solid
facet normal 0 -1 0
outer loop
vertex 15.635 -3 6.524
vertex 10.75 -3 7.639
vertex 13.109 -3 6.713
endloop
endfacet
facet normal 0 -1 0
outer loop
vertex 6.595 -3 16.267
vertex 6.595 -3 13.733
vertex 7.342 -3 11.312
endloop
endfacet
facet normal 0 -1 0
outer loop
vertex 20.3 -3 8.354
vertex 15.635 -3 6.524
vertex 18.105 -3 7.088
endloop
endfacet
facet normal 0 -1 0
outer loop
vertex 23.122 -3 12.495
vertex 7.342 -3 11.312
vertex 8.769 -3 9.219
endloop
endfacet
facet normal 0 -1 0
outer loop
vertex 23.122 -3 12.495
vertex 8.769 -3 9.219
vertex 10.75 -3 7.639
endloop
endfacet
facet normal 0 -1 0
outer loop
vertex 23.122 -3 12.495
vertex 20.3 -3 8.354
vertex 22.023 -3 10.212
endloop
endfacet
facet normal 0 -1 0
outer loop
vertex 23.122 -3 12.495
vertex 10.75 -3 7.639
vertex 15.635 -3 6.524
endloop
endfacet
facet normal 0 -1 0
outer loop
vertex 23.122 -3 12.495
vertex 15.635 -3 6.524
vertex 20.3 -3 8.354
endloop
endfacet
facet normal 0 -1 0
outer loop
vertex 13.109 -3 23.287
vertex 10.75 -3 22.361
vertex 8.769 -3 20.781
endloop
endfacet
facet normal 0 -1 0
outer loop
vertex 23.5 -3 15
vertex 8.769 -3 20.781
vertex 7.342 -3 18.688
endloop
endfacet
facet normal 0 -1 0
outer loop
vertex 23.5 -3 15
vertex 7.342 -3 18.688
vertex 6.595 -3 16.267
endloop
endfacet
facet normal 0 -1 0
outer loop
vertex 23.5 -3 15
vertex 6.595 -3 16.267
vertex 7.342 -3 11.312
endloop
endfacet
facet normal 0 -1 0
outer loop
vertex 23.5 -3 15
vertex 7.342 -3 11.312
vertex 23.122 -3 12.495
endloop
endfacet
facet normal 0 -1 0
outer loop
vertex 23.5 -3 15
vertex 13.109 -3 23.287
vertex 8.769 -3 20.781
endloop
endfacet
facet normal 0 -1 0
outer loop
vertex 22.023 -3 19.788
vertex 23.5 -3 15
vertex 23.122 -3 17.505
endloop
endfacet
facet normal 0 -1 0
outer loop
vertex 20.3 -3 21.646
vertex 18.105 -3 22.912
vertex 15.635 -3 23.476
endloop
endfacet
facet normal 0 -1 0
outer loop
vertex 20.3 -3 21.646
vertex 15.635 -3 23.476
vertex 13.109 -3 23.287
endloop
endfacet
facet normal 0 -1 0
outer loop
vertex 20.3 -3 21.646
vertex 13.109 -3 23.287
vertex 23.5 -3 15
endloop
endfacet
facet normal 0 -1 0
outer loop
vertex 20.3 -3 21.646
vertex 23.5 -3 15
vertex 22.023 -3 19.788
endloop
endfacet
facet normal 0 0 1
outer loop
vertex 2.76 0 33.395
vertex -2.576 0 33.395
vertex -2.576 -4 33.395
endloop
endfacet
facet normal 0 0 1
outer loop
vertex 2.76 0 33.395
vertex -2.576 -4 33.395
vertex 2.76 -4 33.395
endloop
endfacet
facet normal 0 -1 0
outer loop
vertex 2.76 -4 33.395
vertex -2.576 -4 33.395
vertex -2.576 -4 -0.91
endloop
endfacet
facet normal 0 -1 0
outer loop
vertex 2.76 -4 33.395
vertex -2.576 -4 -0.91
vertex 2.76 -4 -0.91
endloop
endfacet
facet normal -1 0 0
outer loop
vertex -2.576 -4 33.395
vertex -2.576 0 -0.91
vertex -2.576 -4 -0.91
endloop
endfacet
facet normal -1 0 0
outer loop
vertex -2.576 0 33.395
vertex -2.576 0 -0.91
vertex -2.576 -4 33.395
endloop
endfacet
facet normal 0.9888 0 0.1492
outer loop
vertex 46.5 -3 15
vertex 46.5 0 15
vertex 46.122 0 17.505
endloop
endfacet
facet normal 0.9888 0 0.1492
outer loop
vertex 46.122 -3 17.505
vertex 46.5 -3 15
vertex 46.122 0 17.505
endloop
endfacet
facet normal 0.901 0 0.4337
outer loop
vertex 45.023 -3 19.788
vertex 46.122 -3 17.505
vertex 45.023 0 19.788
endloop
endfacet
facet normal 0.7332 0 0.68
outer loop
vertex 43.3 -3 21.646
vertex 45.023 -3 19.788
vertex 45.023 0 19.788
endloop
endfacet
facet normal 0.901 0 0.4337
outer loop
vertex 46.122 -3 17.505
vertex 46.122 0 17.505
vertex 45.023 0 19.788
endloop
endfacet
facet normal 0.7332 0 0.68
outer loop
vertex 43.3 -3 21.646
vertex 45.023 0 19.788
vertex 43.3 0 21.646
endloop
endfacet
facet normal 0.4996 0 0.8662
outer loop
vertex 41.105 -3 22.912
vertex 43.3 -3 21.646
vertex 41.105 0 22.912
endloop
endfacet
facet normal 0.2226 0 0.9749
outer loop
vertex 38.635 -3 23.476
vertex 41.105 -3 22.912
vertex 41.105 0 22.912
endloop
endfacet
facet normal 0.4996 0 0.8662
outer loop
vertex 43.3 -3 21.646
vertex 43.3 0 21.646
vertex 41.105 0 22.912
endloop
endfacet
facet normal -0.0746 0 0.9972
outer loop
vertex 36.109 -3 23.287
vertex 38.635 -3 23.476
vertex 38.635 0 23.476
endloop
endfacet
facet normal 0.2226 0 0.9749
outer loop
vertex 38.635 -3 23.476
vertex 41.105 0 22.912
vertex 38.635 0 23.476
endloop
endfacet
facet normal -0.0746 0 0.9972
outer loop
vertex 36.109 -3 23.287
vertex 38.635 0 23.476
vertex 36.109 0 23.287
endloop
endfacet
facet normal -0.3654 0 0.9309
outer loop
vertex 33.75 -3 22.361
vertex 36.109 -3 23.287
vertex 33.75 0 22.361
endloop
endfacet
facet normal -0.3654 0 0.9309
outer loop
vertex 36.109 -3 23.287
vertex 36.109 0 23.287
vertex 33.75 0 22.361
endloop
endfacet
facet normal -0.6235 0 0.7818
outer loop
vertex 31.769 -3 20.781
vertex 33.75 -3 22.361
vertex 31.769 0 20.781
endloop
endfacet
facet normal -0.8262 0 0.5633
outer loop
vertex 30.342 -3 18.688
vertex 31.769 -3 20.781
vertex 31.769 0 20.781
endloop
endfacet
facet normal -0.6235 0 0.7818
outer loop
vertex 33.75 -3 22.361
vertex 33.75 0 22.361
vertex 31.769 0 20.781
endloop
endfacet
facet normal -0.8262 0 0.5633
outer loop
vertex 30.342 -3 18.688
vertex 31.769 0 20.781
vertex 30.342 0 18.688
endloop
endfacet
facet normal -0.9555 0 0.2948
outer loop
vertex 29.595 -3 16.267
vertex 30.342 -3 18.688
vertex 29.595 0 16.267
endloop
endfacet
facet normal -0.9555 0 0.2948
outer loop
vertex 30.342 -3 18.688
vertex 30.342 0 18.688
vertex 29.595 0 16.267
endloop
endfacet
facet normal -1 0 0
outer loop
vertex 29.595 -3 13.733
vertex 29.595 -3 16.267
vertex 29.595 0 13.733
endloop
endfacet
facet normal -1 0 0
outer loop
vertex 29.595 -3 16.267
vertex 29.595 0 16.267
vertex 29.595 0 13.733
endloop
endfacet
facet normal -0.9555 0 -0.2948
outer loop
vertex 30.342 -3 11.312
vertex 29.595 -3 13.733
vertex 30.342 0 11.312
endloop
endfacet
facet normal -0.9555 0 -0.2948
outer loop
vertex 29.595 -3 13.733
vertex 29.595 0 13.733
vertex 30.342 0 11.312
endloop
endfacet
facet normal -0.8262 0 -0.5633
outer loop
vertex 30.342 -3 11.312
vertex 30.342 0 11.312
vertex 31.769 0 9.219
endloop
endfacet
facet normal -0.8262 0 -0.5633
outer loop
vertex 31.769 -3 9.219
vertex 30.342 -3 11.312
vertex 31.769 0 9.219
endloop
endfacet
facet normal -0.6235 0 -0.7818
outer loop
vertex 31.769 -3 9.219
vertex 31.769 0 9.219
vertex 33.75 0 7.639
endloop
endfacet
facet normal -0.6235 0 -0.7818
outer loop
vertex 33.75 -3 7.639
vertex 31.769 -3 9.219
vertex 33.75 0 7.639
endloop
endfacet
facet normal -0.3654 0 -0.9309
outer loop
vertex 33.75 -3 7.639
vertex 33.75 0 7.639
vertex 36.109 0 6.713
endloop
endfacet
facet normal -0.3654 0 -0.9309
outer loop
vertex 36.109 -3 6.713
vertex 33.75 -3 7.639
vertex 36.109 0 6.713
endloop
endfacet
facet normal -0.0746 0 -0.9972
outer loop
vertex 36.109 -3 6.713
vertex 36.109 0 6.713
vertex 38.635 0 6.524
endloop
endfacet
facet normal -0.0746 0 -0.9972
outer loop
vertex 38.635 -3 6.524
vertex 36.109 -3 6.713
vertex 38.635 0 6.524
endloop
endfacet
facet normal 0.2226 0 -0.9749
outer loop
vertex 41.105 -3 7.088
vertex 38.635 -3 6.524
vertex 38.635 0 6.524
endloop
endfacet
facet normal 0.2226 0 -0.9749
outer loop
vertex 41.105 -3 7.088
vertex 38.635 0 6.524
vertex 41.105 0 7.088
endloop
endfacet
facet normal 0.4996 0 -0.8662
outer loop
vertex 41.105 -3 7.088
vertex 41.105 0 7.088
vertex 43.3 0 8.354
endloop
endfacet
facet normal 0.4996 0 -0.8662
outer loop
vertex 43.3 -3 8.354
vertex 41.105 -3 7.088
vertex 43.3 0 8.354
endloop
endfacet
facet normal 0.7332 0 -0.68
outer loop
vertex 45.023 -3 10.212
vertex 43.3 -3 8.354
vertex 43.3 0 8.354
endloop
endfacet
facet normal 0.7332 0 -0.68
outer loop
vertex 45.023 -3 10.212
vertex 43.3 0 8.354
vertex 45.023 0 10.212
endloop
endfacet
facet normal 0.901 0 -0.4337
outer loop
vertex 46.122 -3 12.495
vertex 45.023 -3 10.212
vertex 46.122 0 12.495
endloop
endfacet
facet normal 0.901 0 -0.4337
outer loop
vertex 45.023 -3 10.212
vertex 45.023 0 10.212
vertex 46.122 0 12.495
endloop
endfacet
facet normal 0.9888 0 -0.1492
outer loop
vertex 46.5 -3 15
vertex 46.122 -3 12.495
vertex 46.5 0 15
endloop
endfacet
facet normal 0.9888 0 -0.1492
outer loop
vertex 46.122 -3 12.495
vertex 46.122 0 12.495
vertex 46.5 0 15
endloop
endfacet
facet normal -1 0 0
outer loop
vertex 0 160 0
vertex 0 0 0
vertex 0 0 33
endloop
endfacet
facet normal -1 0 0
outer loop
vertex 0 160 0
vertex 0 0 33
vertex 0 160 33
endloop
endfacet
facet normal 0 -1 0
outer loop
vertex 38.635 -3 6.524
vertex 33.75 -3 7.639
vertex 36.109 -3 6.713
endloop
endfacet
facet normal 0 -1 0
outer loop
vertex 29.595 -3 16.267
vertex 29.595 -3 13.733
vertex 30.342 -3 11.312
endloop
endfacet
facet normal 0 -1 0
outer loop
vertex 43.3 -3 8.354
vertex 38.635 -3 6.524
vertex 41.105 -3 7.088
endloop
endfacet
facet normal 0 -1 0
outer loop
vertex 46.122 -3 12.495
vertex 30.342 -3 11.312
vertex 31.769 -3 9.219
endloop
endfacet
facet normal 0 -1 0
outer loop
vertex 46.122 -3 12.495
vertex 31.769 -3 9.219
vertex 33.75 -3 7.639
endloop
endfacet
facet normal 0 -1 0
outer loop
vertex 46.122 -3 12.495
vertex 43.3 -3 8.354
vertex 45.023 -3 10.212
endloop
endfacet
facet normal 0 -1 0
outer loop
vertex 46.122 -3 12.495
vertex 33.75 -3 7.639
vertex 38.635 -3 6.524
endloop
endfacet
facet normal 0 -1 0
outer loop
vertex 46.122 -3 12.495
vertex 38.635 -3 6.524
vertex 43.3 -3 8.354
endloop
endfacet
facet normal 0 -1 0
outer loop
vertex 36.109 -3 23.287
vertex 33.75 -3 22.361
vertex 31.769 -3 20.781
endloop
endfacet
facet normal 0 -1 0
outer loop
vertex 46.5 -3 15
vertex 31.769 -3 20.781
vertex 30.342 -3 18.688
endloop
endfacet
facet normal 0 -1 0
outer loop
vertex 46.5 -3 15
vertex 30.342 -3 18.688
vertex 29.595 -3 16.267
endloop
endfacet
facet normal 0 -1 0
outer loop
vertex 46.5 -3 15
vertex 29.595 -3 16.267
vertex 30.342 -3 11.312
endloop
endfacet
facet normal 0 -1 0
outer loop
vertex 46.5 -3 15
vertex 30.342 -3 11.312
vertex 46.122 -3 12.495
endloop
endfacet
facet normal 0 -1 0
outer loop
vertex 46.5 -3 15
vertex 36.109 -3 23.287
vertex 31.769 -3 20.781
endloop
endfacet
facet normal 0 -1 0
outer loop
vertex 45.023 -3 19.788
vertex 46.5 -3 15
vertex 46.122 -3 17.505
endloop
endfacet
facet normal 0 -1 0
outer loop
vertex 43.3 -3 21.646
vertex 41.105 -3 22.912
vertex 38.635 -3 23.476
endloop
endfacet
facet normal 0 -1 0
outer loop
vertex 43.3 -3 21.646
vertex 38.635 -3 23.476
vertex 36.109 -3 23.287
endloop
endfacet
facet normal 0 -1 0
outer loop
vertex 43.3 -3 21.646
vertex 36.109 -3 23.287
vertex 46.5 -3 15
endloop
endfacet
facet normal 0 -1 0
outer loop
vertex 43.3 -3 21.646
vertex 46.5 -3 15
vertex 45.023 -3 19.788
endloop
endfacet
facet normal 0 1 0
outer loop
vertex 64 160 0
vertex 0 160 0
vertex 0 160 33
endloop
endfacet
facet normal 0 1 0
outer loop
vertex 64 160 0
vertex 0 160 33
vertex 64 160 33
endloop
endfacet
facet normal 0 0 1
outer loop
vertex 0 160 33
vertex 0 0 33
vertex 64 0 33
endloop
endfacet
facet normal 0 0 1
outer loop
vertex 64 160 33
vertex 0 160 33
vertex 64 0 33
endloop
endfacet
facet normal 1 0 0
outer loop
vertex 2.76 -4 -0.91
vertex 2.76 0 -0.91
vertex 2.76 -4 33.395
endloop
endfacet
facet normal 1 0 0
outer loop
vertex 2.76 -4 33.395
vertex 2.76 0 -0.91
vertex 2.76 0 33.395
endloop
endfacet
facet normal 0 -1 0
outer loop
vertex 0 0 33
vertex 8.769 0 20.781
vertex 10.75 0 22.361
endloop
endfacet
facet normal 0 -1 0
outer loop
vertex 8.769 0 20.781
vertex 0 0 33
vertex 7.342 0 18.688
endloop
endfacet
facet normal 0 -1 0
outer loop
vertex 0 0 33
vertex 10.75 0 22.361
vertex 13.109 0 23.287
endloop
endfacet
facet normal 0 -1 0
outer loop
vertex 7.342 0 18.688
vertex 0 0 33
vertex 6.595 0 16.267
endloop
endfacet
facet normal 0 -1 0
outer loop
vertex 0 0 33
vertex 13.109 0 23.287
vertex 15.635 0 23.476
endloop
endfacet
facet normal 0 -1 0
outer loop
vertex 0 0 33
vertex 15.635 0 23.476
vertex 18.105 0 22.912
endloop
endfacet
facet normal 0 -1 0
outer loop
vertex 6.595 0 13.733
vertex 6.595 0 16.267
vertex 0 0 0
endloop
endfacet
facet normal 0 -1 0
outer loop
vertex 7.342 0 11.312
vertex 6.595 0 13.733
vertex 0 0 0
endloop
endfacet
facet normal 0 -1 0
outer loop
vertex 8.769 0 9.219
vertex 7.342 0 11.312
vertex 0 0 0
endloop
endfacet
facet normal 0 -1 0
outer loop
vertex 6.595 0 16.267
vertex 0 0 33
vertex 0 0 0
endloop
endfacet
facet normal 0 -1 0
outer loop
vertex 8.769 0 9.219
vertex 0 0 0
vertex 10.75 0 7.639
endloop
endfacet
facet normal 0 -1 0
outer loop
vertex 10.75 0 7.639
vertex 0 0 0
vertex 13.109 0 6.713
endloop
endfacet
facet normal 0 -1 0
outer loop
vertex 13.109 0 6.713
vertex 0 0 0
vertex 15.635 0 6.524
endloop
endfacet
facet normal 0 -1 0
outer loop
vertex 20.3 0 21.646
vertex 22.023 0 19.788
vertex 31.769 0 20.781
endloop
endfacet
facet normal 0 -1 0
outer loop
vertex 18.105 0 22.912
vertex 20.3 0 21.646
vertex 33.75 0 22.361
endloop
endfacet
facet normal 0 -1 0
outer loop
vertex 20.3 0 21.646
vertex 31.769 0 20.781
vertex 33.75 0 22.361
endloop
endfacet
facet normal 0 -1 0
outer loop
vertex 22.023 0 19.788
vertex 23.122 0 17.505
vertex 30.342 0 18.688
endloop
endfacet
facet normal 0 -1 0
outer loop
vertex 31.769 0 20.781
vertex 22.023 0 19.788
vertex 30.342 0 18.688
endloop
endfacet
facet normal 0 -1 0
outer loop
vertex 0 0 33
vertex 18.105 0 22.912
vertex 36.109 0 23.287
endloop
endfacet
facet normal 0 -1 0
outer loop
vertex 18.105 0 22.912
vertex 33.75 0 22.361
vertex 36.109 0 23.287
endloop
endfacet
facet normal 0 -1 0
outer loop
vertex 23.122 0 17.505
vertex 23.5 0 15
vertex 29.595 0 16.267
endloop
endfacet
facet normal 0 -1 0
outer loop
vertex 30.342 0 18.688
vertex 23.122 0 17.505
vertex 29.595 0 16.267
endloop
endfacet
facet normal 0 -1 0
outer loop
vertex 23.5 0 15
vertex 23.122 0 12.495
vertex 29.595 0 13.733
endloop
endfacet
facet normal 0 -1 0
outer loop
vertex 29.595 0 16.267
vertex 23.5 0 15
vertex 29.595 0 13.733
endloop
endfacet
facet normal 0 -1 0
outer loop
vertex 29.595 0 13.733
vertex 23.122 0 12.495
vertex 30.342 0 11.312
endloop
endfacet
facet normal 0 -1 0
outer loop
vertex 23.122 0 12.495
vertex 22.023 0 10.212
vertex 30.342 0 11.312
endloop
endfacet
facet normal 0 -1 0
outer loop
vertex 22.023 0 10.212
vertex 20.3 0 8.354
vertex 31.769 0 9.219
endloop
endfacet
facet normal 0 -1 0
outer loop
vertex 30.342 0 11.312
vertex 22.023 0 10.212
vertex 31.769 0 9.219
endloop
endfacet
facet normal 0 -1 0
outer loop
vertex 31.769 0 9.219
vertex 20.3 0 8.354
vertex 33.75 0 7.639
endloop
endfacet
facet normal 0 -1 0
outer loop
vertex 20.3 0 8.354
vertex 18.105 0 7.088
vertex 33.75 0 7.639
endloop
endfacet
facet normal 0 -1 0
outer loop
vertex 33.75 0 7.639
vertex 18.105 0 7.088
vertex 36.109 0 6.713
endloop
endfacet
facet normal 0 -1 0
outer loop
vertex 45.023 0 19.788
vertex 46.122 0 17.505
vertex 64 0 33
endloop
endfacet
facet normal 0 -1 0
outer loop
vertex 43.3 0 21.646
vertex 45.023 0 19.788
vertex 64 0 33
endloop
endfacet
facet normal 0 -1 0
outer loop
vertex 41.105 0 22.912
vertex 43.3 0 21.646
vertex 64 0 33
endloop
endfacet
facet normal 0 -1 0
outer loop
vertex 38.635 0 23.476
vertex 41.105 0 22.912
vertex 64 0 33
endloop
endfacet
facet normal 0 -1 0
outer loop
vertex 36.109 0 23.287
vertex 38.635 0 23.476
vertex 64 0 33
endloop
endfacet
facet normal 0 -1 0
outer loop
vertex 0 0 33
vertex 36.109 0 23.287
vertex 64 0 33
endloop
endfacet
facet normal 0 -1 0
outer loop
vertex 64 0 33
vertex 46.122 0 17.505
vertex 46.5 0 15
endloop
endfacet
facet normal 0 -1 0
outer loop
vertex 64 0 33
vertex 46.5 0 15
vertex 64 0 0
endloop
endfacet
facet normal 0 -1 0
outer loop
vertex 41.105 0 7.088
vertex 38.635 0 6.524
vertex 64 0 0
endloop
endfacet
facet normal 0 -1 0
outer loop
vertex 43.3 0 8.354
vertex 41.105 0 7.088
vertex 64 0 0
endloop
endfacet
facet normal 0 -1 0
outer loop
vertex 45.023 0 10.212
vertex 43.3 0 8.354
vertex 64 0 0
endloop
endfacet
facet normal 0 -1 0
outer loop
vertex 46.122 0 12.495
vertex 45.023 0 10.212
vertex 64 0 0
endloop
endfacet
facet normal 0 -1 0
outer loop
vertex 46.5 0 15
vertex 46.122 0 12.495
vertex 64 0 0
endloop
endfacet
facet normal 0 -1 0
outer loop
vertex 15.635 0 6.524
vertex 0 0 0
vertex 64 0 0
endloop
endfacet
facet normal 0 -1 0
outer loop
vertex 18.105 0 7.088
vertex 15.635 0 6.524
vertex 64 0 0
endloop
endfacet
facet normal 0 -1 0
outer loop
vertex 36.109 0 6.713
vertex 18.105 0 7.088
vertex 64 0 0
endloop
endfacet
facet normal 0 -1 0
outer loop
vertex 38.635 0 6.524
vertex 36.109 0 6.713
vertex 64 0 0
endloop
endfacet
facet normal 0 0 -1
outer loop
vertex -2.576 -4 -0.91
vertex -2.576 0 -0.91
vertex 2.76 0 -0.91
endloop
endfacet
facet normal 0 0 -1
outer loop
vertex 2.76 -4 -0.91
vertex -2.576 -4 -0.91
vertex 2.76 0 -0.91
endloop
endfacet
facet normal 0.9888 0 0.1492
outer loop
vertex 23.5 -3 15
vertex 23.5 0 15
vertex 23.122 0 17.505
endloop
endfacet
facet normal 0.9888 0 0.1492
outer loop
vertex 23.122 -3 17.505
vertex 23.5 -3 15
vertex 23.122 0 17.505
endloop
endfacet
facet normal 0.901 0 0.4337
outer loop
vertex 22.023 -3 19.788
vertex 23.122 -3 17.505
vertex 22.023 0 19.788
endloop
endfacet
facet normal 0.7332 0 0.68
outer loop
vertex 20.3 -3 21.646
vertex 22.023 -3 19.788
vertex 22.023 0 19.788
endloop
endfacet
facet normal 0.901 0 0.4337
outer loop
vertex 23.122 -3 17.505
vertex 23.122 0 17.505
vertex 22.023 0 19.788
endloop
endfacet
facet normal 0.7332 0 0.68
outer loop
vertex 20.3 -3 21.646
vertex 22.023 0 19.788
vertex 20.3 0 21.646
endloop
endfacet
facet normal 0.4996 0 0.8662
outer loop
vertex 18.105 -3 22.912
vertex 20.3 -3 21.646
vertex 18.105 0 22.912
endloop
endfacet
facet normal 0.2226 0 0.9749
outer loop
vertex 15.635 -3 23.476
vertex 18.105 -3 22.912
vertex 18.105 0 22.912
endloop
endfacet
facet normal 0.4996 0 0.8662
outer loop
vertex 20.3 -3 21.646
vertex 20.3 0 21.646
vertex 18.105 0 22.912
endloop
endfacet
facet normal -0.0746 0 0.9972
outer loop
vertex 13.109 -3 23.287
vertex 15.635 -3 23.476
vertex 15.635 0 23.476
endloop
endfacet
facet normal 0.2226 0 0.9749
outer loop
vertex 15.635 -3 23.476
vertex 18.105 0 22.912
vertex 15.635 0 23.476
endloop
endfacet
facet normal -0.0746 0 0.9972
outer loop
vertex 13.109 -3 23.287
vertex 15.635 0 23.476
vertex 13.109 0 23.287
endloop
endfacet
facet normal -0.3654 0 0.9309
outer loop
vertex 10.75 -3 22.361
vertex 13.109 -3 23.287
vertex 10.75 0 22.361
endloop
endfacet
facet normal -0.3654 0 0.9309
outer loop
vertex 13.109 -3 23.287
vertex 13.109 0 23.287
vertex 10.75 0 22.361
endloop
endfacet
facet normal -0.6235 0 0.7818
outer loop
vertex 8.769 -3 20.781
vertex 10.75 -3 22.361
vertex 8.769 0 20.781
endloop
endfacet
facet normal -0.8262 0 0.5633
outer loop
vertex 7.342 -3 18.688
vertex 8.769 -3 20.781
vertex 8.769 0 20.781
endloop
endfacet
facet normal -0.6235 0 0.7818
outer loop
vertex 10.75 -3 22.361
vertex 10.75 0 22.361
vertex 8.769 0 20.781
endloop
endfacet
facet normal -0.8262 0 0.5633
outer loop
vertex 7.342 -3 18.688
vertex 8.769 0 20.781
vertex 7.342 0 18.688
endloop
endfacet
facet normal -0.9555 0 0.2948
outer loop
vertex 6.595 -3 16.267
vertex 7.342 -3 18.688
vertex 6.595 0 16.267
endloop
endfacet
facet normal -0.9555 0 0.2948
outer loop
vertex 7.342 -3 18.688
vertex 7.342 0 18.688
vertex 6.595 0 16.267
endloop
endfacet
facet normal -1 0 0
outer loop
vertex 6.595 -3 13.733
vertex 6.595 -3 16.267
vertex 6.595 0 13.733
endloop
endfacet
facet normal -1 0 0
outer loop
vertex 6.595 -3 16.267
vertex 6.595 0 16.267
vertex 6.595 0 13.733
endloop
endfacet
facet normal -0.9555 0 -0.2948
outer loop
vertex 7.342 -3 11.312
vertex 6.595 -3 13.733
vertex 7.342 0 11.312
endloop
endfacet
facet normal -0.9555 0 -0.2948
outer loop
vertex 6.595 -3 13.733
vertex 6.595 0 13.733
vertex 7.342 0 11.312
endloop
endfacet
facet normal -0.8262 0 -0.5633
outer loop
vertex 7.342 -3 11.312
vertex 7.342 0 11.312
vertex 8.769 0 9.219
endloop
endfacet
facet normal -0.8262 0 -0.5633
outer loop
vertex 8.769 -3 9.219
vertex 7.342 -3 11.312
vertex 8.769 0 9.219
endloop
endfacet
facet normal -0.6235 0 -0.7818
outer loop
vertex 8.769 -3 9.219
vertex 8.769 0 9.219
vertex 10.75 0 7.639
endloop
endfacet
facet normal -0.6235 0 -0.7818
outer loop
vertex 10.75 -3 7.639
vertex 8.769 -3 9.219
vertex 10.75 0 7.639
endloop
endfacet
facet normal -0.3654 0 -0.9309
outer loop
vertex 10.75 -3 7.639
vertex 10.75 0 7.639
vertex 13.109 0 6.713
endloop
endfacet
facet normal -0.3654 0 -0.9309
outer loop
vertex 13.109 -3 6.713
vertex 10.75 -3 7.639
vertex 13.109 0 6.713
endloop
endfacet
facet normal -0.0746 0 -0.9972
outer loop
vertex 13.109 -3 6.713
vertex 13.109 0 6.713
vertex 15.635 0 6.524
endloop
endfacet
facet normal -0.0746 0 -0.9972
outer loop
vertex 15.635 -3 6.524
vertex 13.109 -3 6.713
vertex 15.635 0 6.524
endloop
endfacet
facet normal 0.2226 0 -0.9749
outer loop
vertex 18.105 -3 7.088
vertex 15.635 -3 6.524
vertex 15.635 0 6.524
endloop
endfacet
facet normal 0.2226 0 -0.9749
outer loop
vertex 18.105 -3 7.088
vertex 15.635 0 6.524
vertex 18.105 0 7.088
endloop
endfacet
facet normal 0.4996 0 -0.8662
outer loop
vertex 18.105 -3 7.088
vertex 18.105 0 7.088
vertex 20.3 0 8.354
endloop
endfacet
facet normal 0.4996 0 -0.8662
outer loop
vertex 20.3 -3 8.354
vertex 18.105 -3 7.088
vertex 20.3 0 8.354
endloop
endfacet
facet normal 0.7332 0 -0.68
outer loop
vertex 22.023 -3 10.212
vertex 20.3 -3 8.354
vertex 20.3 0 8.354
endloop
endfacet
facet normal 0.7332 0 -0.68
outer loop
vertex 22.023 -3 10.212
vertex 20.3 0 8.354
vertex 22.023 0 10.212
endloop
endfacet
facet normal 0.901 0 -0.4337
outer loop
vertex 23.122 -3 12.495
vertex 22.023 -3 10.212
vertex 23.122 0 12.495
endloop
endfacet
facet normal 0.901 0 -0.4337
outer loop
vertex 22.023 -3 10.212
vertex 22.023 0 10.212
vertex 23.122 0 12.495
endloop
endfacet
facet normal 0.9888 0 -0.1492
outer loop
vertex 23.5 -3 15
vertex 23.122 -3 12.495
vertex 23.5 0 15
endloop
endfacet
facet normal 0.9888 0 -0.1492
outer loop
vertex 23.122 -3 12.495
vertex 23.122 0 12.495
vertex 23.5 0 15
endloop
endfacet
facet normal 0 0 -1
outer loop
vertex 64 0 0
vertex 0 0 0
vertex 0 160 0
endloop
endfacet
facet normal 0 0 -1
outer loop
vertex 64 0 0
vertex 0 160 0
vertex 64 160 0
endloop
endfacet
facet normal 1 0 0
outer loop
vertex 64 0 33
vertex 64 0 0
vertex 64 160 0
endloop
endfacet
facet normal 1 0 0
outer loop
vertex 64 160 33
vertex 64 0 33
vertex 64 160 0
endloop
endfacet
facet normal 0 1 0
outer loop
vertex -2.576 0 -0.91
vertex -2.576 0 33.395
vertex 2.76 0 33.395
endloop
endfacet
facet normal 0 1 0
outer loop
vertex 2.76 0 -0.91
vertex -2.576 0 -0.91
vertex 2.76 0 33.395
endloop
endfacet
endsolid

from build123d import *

# Parameters (mm, degrees)
SKETCH001_W   = 64
SKETCH001_H   = 160
PAD_DEPTH     = 33
SKETCH_R      = 8.5
PAD001_DEPTH  = 3
SKETCH002_W   = 5.336926
SKETCH002_H   = 34.30467
EXTRUDE_DEPTH = 4


with BuildPart() as pad001:
    # Sketch001 → Pad (new body)
    with BuildSketch(Plane.XY):
        with Locations((32, 80)):
            Rectangle(SKETCH001_W, SKETCH001_H)
    extrude(amount=PAD_DEPTH)

    # Sketch (on Face3 of Pad) → Pad001 (new body)
    with BuildSketch(Plane.XZ):
        with Locations((15, 15)):
            Circle(SKETCH_R)
        with Locations((38, 15)):
            Circle(SKETCH_R)
    extrude(amount=PAD001_DEPTH)


with BuildPart() as extrude_body:
    # Sketch002 → Extrude (new body)
    with BuildSketch(Plane.XZ):
        with Locations((0.09197, 16.242444)):
            Rectangle(SKETCH002_W, SKETCH002_H)
    extrude(amount=EXTRUDE_DEPTH)


solid = Compound([pad001.part, extrude_body.part])
